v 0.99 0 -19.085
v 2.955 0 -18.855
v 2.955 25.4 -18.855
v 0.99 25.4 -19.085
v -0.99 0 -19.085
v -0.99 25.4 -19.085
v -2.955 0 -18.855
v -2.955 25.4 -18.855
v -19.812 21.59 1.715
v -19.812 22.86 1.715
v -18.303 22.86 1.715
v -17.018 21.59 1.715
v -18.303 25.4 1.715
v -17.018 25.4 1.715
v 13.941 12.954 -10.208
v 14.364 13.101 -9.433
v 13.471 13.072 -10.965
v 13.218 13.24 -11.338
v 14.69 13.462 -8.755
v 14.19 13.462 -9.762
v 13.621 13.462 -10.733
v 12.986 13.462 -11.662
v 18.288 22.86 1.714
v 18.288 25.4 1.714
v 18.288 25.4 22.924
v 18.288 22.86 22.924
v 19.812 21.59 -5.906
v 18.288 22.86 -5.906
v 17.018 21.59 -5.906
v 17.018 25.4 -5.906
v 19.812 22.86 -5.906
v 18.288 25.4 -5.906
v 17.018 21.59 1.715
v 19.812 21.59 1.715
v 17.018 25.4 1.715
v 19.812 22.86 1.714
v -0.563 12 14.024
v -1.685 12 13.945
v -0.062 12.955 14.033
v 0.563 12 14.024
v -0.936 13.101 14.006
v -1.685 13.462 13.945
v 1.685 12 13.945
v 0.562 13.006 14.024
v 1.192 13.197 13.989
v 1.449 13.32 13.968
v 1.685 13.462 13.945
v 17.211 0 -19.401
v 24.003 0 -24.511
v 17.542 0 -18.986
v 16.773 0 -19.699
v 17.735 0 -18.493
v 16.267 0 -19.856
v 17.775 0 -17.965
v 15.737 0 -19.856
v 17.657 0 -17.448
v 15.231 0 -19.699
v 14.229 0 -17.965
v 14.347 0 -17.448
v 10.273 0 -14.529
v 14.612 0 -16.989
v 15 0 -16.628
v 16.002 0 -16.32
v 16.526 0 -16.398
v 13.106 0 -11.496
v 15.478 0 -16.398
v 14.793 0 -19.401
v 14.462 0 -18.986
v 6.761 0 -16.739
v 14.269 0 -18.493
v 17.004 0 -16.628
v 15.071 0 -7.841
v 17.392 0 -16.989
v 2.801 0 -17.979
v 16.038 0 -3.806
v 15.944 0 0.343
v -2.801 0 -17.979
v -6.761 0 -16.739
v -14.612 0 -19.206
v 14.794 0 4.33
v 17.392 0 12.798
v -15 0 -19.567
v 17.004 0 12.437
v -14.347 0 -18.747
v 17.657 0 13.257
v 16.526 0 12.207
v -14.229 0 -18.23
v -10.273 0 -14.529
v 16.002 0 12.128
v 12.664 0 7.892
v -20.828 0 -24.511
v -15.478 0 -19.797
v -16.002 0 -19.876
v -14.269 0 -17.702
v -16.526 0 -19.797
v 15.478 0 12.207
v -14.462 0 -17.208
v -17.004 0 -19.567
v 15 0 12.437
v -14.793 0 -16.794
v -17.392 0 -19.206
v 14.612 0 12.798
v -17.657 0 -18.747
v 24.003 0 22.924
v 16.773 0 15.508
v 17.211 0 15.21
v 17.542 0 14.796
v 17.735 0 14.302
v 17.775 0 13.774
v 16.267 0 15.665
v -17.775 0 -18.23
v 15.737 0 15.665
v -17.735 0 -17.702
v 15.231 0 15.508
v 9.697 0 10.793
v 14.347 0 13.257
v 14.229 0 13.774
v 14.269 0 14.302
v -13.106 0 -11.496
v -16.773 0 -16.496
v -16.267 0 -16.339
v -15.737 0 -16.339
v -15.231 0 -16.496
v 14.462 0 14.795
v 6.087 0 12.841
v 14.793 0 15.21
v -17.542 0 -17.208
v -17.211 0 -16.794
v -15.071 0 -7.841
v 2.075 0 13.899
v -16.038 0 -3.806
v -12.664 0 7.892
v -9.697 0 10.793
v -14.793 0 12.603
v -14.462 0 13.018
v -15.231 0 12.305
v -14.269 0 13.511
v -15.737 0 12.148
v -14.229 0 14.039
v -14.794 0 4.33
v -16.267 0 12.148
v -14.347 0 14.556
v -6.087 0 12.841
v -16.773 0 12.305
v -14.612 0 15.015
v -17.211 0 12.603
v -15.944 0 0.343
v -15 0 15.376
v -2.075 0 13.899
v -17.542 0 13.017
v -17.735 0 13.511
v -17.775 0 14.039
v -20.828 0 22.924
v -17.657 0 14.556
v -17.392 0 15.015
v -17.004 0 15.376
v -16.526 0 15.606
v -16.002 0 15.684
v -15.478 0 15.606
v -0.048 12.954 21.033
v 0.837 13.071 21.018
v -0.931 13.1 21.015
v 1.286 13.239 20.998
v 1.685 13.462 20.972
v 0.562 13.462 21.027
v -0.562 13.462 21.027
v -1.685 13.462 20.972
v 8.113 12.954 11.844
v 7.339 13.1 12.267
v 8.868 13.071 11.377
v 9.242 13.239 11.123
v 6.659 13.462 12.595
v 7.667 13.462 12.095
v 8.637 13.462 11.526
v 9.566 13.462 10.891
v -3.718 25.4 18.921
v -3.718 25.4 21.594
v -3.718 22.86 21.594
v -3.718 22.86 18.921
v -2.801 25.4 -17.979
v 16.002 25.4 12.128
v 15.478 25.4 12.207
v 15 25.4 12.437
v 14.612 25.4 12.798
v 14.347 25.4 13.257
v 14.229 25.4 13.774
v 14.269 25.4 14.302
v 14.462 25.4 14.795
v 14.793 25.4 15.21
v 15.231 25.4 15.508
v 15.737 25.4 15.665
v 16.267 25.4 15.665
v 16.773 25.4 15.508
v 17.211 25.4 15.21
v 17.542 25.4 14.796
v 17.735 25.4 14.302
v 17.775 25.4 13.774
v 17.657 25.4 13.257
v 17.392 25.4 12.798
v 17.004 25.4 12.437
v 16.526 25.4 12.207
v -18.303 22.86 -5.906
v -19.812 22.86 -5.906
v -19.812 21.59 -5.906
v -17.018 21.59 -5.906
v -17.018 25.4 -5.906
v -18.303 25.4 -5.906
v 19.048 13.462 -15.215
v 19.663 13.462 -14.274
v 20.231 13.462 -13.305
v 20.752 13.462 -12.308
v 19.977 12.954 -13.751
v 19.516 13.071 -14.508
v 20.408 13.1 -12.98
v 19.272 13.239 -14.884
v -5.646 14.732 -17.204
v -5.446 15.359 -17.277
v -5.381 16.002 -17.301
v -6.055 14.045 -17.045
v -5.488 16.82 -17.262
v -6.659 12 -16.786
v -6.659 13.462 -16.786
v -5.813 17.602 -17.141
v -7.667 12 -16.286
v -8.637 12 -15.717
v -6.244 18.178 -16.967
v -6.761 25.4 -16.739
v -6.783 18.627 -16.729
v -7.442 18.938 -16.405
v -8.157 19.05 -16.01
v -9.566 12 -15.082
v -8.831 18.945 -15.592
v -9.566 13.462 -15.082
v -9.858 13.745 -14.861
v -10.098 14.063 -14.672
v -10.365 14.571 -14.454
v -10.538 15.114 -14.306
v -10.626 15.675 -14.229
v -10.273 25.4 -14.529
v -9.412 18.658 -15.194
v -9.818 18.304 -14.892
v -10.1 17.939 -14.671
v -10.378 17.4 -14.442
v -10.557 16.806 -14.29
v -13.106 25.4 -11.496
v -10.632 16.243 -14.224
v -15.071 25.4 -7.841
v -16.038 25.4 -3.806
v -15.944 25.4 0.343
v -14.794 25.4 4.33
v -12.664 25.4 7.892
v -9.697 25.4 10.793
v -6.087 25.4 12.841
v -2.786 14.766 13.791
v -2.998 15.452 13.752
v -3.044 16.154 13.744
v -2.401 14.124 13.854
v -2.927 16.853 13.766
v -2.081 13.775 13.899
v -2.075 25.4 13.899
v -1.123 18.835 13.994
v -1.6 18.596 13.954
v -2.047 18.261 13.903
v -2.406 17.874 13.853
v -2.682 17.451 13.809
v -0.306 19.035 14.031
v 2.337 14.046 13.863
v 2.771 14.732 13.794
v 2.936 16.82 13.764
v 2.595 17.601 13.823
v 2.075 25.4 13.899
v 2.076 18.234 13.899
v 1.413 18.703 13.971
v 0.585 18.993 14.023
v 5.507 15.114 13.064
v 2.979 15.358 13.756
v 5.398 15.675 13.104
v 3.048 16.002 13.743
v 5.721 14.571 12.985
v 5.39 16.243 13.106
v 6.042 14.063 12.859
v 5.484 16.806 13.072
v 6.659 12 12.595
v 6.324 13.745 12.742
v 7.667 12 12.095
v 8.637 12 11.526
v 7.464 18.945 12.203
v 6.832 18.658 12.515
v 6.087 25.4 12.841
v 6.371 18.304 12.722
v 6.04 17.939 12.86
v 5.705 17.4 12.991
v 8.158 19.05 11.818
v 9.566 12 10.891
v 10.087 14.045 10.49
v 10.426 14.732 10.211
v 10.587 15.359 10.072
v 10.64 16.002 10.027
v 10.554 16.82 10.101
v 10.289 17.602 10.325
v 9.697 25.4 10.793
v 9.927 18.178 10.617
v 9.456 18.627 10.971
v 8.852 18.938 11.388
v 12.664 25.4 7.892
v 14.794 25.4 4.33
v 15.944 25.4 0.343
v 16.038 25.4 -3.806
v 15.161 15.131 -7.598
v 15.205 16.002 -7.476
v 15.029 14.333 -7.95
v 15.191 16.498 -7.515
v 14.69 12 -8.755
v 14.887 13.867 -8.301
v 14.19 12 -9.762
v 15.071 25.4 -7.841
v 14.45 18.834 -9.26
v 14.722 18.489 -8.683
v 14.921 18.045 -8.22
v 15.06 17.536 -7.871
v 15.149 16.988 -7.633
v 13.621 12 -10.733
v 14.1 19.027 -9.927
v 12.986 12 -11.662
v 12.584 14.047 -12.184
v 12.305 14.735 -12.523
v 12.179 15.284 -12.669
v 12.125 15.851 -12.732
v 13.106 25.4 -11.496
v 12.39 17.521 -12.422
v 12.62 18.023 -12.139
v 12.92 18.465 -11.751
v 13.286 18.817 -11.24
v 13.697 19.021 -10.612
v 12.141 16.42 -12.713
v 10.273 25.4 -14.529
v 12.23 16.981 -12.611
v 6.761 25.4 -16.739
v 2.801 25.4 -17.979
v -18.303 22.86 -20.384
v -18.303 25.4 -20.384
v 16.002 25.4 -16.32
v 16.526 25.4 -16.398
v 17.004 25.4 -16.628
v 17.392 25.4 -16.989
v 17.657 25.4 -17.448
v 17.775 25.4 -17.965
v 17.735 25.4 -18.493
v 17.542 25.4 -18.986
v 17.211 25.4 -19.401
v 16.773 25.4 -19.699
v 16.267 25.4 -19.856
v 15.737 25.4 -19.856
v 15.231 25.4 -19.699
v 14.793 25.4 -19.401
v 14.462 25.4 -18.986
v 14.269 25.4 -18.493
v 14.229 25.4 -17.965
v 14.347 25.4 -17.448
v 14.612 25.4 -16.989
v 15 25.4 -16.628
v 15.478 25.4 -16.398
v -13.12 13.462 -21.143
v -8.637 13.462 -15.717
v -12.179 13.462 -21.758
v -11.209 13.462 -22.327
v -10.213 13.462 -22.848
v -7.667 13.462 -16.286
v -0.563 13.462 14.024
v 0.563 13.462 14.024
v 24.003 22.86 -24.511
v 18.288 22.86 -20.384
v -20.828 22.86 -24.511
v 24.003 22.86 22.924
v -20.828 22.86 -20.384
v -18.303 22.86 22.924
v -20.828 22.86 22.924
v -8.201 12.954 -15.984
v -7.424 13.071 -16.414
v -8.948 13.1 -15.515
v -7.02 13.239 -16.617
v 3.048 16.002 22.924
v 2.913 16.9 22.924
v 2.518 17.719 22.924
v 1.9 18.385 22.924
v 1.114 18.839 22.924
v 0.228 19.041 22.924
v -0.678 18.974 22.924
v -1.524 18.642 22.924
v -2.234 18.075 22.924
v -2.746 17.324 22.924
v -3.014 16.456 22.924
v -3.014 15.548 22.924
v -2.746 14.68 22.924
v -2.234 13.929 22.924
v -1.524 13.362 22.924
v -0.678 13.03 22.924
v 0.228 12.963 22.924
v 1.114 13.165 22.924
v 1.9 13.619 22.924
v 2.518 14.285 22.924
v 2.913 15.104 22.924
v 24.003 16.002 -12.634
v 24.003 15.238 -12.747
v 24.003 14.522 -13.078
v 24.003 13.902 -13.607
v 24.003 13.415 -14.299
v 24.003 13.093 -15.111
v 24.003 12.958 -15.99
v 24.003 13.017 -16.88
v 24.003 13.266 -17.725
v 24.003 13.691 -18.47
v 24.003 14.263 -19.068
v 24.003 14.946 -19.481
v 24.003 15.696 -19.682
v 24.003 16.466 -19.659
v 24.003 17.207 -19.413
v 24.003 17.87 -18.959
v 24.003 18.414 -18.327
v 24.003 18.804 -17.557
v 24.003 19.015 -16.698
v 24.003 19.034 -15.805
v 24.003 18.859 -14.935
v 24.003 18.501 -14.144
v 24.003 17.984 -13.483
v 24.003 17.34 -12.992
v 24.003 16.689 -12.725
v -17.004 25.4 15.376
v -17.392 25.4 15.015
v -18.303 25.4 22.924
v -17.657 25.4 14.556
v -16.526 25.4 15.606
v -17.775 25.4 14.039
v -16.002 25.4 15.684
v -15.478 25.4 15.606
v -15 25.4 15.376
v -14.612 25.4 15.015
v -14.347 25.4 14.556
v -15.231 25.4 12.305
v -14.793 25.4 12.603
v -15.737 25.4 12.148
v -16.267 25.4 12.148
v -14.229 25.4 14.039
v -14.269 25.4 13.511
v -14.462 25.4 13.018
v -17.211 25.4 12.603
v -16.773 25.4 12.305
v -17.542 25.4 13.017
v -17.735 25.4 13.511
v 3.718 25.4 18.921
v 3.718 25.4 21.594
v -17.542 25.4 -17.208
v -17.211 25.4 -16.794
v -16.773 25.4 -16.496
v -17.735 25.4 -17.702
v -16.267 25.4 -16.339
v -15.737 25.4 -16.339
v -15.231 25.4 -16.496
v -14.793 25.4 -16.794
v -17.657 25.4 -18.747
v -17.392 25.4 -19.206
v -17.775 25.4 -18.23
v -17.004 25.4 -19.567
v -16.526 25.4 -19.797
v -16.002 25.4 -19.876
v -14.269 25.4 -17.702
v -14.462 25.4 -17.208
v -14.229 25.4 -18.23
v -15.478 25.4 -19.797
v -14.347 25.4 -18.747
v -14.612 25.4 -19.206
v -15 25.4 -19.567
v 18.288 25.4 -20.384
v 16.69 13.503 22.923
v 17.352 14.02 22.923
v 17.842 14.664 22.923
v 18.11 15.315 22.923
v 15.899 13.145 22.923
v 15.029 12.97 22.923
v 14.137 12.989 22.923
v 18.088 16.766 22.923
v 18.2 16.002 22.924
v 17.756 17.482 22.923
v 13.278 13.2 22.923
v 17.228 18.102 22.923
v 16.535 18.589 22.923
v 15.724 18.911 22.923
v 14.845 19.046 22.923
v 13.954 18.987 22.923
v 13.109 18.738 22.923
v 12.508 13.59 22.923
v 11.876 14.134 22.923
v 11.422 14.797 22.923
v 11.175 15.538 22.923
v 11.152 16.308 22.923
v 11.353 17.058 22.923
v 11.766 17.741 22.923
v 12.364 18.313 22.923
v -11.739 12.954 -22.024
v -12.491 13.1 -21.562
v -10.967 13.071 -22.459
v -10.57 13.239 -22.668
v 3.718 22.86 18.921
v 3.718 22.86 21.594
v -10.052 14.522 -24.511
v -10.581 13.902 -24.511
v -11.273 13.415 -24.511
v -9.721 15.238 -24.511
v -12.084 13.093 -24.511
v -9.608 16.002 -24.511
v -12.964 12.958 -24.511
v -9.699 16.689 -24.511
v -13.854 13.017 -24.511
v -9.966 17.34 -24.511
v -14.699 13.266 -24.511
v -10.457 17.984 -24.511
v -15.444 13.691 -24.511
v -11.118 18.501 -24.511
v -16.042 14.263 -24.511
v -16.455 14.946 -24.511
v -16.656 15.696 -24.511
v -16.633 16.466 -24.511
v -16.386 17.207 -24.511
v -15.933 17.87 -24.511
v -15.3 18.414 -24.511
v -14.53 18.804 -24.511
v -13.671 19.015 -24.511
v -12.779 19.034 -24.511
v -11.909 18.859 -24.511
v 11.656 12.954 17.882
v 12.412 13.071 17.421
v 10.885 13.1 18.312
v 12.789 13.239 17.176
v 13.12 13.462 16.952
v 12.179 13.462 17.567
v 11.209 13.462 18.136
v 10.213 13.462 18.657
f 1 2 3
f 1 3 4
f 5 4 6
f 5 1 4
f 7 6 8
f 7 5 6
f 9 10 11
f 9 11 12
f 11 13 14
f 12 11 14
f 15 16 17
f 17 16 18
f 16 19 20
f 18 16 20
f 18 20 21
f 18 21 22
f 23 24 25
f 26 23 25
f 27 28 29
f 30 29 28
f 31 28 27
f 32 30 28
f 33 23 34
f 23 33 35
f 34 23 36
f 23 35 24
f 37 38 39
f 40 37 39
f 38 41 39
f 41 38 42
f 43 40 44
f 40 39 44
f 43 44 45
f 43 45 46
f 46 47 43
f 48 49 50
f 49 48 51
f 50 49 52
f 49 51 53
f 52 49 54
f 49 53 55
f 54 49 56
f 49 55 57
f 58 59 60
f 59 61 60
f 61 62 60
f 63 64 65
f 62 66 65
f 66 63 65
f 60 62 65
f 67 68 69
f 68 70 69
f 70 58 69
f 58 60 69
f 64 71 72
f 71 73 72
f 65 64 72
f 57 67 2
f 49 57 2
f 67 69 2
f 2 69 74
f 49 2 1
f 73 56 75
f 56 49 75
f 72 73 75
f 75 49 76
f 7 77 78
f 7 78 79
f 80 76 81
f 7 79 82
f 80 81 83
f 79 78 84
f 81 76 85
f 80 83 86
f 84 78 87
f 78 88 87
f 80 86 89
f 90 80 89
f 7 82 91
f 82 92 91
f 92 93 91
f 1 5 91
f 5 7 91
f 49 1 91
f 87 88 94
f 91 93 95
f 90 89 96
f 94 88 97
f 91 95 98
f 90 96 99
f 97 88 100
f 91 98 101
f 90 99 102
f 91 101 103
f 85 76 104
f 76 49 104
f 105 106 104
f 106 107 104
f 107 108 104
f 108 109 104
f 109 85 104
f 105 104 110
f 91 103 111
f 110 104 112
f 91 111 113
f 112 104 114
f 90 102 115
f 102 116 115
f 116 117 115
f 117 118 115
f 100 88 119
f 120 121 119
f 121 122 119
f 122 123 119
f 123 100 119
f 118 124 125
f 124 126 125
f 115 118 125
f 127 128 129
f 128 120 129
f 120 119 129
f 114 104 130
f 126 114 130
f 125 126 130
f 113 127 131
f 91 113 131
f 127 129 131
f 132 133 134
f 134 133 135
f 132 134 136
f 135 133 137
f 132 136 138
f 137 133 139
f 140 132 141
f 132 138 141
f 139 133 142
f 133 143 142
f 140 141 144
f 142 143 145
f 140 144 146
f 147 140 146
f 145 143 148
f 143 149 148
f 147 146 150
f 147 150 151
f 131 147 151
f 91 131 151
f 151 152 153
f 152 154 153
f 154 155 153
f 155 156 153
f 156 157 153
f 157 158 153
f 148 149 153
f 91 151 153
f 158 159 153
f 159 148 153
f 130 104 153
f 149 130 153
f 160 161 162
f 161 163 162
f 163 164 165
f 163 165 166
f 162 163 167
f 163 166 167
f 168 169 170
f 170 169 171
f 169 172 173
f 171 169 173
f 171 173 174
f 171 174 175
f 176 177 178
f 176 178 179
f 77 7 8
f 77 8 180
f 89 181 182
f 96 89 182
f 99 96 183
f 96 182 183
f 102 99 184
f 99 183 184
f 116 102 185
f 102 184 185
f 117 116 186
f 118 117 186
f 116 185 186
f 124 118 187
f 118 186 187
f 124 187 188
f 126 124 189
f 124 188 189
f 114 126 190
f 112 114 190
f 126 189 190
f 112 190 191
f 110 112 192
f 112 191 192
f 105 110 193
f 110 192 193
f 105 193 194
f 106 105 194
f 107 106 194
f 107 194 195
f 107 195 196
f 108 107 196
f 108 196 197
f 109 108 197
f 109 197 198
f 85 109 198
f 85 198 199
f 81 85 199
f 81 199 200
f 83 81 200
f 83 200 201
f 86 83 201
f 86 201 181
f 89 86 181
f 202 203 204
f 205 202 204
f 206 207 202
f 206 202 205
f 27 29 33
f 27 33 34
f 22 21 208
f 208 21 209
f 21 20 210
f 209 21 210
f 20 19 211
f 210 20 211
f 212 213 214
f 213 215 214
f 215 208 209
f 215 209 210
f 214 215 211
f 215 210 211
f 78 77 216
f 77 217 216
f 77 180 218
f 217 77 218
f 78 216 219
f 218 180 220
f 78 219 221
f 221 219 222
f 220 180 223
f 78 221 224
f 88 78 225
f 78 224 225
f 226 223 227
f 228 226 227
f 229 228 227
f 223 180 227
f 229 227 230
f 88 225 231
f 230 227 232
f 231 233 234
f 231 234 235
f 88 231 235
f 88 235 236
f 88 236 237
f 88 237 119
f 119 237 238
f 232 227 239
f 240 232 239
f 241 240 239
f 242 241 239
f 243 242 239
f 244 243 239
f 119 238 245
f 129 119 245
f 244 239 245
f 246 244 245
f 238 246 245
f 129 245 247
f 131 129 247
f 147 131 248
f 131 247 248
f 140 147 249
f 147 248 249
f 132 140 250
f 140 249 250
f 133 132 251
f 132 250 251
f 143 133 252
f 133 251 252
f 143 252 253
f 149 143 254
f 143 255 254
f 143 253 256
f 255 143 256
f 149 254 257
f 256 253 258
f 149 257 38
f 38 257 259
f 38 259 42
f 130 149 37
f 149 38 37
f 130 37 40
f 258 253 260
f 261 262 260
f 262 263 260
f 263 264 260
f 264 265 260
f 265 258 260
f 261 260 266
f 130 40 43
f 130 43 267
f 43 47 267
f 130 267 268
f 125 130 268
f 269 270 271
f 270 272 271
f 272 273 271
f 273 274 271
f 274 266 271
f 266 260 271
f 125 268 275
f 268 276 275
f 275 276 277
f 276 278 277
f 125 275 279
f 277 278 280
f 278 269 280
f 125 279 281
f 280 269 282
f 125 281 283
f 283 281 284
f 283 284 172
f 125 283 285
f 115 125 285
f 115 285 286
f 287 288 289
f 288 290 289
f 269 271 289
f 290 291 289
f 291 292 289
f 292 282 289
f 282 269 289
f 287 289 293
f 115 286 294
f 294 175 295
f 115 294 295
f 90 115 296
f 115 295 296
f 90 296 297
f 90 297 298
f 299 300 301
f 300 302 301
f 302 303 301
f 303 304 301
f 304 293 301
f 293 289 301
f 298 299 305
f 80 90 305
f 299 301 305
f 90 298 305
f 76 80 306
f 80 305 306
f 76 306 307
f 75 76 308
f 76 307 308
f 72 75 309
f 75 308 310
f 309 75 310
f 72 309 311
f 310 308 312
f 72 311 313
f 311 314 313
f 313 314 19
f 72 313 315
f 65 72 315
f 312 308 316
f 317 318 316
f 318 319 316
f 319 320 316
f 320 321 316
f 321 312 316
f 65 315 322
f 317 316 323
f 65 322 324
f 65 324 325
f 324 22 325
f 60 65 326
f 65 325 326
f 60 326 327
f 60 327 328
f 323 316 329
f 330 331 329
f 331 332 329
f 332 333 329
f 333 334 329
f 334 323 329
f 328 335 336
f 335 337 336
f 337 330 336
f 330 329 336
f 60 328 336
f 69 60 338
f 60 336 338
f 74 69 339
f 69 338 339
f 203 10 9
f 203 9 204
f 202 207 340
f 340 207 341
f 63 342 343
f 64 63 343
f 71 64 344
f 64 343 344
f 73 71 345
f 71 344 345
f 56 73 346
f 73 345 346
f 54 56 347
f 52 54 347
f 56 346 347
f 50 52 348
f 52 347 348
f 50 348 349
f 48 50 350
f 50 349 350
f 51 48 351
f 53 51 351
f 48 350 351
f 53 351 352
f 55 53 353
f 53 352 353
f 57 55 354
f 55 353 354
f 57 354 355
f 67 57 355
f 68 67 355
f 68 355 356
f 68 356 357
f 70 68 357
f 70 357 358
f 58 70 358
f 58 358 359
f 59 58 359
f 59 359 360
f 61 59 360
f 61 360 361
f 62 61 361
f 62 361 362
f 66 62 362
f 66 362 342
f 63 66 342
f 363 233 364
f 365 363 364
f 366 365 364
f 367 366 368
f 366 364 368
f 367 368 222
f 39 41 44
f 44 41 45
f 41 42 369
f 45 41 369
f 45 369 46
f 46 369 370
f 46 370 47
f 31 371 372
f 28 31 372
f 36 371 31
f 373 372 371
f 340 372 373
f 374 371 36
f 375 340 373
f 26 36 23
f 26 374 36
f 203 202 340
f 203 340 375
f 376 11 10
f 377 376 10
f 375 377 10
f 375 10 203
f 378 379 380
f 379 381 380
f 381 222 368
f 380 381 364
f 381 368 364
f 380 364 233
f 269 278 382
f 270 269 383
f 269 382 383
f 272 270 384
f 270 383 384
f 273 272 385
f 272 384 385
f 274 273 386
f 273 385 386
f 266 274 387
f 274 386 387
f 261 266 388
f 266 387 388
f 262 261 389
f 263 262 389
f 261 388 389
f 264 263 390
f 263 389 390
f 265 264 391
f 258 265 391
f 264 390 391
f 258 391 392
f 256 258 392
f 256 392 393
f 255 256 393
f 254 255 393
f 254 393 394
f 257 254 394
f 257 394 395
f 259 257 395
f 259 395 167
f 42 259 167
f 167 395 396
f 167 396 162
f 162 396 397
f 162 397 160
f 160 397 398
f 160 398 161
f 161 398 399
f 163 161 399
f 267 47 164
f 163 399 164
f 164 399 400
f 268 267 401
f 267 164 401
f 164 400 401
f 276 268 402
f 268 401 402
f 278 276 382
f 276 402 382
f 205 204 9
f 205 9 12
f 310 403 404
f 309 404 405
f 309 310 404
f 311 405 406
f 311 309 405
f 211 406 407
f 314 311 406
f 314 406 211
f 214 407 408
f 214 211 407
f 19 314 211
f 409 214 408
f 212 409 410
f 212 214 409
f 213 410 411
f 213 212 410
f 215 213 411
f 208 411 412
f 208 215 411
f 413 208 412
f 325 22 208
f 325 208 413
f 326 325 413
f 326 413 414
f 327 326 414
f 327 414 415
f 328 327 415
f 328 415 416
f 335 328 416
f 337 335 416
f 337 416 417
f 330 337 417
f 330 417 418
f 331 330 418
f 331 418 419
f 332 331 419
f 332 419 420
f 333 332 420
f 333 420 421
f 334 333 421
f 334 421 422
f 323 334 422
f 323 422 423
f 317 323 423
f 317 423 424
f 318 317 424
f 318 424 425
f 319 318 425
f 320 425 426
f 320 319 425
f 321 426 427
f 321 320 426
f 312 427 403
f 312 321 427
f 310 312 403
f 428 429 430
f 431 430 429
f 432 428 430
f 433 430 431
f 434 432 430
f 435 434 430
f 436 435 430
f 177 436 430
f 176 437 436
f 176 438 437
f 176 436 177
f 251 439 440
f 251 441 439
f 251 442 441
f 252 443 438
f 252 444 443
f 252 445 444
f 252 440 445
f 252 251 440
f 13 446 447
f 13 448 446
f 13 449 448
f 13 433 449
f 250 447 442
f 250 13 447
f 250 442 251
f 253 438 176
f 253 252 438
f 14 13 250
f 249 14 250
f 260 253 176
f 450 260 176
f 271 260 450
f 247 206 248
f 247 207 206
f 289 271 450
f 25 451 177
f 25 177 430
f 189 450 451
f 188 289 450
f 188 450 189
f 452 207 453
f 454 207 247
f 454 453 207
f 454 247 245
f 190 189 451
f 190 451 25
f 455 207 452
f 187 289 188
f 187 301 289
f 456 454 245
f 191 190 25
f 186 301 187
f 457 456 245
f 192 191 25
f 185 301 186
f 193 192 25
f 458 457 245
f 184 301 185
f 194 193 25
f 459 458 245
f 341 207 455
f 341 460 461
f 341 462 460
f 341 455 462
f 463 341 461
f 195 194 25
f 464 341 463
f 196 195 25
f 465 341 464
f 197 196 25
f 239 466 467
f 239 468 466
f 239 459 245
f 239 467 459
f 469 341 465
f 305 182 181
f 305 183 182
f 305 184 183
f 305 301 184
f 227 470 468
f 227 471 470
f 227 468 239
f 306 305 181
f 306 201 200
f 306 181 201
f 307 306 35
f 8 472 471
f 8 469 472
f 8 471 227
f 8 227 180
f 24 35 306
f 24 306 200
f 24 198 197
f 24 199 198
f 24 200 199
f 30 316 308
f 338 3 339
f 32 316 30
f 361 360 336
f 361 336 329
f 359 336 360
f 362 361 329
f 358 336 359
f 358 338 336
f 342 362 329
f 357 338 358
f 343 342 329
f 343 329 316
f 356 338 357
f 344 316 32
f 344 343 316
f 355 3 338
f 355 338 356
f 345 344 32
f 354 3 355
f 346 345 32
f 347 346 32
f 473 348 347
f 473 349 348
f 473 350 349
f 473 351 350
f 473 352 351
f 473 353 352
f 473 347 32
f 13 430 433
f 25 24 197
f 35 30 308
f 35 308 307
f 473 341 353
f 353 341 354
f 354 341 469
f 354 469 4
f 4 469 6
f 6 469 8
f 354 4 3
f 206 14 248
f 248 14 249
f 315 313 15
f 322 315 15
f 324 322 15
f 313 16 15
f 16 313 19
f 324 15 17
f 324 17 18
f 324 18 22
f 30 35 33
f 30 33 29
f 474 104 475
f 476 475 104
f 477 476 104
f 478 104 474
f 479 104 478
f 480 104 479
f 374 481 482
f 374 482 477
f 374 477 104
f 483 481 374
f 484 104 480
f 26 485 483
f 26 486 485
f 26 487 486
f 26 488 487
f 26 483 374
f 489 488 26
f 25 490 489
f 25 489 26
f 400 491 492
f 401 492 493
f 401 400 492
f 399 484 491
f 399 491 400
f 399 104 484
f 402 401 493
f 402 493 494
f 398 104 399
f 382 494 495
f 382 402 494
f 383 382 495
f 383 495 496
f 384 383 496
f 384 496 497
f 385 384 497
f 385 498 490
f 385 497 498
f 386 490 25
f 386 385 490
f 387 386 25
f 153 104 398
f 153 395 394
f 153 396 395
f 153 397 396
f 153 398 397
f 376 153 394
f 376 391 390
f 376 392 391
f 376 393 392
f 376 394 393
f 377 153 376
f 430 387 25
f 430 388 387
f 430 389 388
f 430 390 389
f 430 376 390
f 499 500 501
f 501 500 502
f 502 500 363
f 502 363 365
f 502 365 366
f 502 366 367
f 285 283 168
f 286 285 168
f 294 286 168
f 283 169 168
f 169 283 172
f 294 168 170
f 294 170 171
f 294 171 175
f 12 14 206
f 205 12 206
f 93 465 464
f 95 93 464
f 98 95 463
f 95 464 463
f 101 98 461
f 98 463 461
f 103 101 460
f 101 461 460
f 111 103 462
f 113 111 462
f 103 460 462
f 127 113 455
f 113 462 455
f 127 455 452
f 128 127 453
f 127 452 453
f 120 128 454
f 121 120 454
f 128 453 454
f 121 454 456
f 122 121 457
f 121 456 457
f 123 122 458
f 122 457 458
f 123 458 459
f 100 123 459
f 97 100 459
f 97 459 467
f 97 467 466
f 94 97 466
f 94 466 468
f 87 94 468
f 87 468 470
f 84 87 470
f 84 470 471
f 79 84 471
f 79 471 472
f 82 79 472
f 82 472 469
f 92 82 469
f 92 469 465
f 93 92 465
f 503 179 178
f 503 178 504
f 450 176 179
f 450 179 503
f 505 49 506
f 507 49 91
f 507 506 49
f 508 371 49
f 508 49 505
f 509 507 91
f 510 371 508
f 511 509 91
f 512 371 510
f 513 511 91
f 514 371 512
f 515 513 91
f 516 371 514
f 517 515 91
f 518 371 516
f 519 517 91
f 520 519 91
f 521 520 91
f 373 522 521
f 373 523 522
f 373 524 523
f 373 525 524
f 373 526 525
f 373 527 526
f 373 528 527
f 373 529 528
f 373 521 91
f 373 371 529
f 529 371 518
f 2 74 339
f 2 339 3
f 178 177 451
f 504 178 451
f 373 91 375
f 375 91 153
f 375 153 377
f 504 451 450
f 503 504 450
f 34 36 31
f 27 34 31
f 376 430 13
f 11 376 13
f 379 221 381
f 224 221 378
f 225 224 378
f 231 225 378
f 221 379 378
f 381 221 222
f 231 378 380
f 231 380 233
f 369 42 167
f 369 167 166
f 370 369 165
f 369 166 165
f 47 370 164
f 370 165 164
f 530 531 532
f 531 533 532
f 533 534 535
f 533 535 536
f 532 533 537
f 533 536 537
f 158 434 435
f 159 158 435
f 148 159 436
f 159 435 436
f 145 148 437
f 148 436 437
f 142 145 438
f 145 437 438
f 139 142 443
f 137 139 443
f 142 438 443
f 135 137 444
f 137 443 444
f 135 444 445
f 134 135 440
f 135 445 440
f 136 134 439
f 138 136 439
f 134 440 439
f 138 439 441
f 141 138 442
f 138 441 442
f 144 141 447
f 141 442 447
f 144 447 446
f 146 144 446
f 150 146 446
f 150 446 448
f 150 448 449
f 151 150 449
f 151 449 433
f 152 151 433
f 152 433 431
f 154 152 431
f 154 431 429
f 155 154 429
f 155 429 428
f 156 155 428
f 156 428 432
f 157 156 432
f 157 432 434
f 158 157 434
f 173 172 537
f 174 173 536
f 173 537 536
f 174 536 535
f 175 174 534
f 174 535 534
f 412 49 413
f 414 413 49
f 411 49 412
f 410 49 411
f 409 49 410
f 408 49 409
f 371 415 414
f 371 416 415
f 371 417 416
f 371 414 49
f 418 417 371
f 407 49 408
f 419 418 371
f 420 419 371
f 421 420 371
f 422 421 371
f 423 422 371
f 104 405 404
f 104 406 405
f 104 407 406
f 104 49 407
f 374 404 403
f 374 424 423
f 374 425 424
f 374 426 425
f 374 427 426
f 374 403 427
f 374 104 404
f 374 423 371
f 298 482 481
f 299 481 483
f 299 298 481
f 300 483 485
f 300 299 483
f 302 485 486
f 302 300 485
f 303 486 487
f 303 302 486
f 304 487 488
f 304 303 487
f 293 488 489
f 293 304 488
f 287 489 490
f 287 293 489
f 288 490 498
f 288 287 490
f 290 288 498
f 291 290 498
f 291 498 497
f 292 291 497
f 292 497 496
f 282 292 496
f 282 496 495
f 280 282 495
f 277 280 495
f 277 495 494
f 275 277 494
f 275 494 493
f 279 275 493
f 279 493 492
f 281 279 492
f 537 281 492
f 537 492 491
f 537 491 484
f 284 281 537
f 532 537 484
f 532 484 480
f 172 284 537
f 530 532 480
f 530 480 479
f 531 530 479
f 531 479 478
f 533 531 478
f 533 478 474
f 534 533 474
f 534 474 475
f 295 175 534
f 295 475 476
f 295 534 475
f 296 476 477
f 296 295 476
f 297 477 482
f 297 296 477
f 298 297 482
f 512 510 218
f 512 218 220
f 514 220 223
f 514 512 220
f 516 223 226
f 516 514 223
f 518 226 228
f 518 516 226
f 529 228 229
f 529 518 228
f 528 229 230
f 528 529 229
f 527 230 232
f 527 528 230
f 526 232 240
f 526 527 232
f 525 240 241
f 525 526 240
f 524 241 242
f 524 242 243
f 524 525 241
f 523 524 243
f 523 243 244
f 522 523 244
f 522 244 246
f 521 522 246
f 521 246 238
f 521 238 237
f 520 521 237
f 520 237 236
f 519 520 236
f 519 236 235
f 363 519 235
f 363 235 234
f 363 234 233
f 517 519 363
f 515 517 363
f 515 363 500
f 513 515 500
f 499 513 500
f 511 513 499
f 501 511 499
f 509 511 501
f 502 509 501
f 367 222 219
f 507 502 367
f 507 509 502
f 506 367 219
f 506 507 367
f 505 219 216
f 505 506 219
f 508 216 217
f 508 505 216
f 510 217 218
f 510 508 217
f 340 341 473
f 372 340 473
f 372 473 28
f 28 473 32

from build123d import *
from build123d.topology import SkipClean

# Parameters (mm, degrees)
SKETCH1_W                = 41.656
SKETCH1_H                = 45.847
BOSS_EXTRUDE1_DEPTH      = 25.4
SKETCH2_R                = 16.129
CUT_EXTRUDE1_DEPTH       = 25.4
SKETCH3_W                = 2.794
SKETCH3_H                = 7.62
CUT_EXTRUDE2_DEPTH       = 3.81
CUT_EXTRUDE6_START       = -25.4
CUT_EXTRUDE6_DEPTH       = 25.4
CUT_EXTRUDE7_REACH       = 58.4
CUT_EXTRUDE7_END_RADIUS  = 16.129
SKETCH7_R                = 3.048
SKETCH14_W               = 7.43654476
SKETCH14_H               = 2.672753785
SKETCH14_W_2             = 2.524584731
SKETCH14_H_2             = 43.307
CUT_EXTRUDE10_DEPTH      = 2.54
SKETCH17_W               = 45.847
SKETCH17_H               = 22.86
BOSS_EXTRUDE3_DEPTH      = 3.175
CUT_EXTRUDE12_REACH      = 43.576
SKETCH12_R               = 3.048
SKETCH18_W               = 44.831
SKETCH18_H               = 22.86
BOSS_EXTRUDE4_DEPTH      = 1.5875
CUT_EXTRUDE13_DEPTH      = 44.190833792
CUT_EXTRUDE13_DEPTH_BACK = 44.190833792
SKETCH11_R               = 3.048
BOSS_EXTRUDE8_START      = -13.462
BOSS_EXTRUDE8_DEPTH      = 1.462
SKETCH4_R                = 1.778
CUT_EXTRUDE14_DEPTH      = 43.685983001


with BuildPart() as part:
    # Sketch1 → Boss-Extrude1 (new body)
    with BuildSketch(Plane(origin=(0, 0, 0), x_dir=(1, 0, 0), z_dir=(0, 1, 0))):
        Rectangle(SKETCH1_W, SKETCH1_H)
    extrude(amount=BOSS_EXTRUDE1_DEPTH)

    # Sketch2 → Cut-Extrude1 (cut)
    with BuildSketch(Plane(origin=(0, 25.4, 0), x_dir=(1, 0, 0), z_dir=(0, 1, 0))):
        with Locations(Location((0, 2.0955, 0), (0, 0, 270))):
            Circle(SKETCH2_R)
    extrude(amount=-CUT_EXTRUDE1_DEPTH, mode=Mode.SUBTRACT)

    # Sketch3 → Cut-Extrude2 (cut)
    with BuildSketch(Plane(origin=(0, 25.4, 0), x_dir=(1, 0, 0), z_dir=(0, 1, 0))):
        with Locations((18.415, 2.0955)):
            Rectangle(SKETCH3_W, SKETCH3_H)
        with Locations((-18.415, 2.0955)):
            Rectangle(SKETCH3_W, SKETCH3_H)
    extrude(amount=-CUT_EXTRUDE2_DEPTH, mode=Mode.SUBTRACT)

    # Sketch6 → Cut-Extrude6 (cut)
    with BuildSketch(Plane(origin=(0, 25.4, 0), x_dir=(1, 0, 0), z_dir=(0, 1, 0)).offset(CUT_EXTRUDE6_START)):
        with BuildLine():
            ThreePointArc((-2.800771458, 17.979464248), (-1.405734975, 18.163124286), (0, 18.2245))
            ThreePointArc((0, 18.2245), (1.405734975, 18.163124286), (2.800771458, 17.979464248))
            Line((2.800771458, 17.979464248), (2.955144688, 18.854958341))
            ThreePointArc((2.955144688, 18.854958341), (0, 19.1135), (-2.955144688, 18.854958341))
            Line((-2.955144688, 18.854958341), (-2.800771458, 17.979464248))
        make_face()
        with BuildLine():
            Line((0, 18.2245), (0, 2.0955))
            Line((0, 2.0955), (2.800771458, 17.979464248))
            ThreePointArc((2.800771458, 17.979464248), (1.405734975, 18.163124286), (0, 18.2245))
        make_face()
        with BuildLine():
            Line((-2.800771458, 17.979464248), (0, 2.0955))
            Line((0, 2.0955), (0, 18.2245))
            ThreePointArc((0, 18.2245), (-1.405734975, 18.163124286), (-2.800771458, 17.979464248))
        make_face()
    extrude(amount=CUT_EXTRUDE6_DEPTH, mode=Mode.SUBTRACT)

    # Cut-Extrude7: up to this cylinder (the profile starts outside it)
    cut_extrude7_end = Plane(origin=(0, 16.002, -2.0955), z_dir=(0, 1, 0)) * Cylinder(CUT_EXTRUDE7_END_RADIUS, 150.058, mode=Mode.PRIVATE)
    # Sketch7 → Cut-Extrude7 (cut, up to the surface)
    with BuildSketch(Plane.XY.offset(22.9235), mode=Mode.PRIVATE) as cut_extrude7_sk1:
        with Locations((0, 16.002)):
            Circle(SKETCH7_R)
    cut_extrude7_tool1 = extrude(cut_extrude7_sk1.sketch, amount=-CUT_EXTRUDE7_REACH, mode=Mode.PRIVATE) - cut_extrude7_end
    add(cut_extrude7_tool1.solids().sort_by_distance((0, 16.002, 22.9235))[0], mode=Mode.SUBTRACT)

    # Sketch14 → Cut-Extrude10 (cut)
    with BuildSketch(Plane(origin=(0, 25.4, 0), x_dir=(1, 0, 0), z_dir=(0, 1, 0))):
        with Locations((0, -20.25731759)):
            Rectangle(SKETCH14_W, SKETCH14_H)
        Polygon((20.828, -22.9235), (20.828, 20.3835), (18.288, 20.3835), (18.288, 5.9055), (19.812, 5.9055), (19.812, -1.7145), (18.288, -1.7145), (18.288, -22.9235), align=None)
        Polygon((20.828, 22.9235), (-20.828, 22.9235), (-20.828, 20.3835), (-18.303415269, 20.3835), (18.288, 20.3835), (20.828, 20.3835), align=None)
        with Locations((-19.565707635, -1.27)):
            Rectangle(SKETCH14_W_2, SKETCH14_H_2)
    extrude(amount=-CUT_EXTRUDE10_DEPTH, mode=Mode.SUBTRACT)

    # Sketch17 → Boss-Extrude3 (add)
    with BuildSketch(Plane(origin=(20.828, 0, 0), x_dir=(0, 0, -1), z_dir=(1, 0, 0))):
        with Locations((0, 11.43)):
            Rectangle(SKETCH17_W, SKETCH17_H)
    extrude(amount=BOSS_EXTRUDE3_DEPTH)

    # Cut-Extrude12: up to this plane
    cut_extrude12_end = Plane(origin=(24.003, 0, 0), z_dir=(1, 0, 0))
    # Sketch12 → Cut-Extrude12 (cut, up to the surface)
    with BuildSketch(Plane(origin=(0.914260378, 0, -0.535980498), x_dir=(-0.50574390925612, 0, -0.862683660590797), z_dir=(0.862683660590797, 0, -0.50574390925612)), mode=Mode.PRIVATE) as cut_extrude12_sk1:
        with Locations(Location((1.807753611, 16.002, 0), (0, 0, 180))):
            Circle(SKETCH12_R)
    cut_extrude12_tool1 = split(extrude(cut_extrude12_sk1.sketch, amount=CUT_EXTRUDE12_REACH, mode=Mode.PRIVATE), bisect_by=cut_extrude12_end, keep=Keep.BOTH, mode=Mode.PRIVATE)
    add(cut_extrude12_tool1.solids().sort_by_distance((0, 16.002, -2.0955))[0], mode=Mode.SUBTRACT)

    # Sketch18 → Boss-Extrude4 (add)
    with BuildSketch(Plane(origin=(0, 0, -22.9235), x_dir=(-1, 0, 0), z_dir=(0, 0, -1))):
        with Locations((-1.5875, 11.43)):
            Rectangle(SKETCH18_W, SKETCH18_H)
    extrude(amount=BOSS_EXTRUDE4_DEPTH)

    # Sketch11 → Cut-Extrude13 (cut, two sides: drawn at the far end of the back side and taken through both)
    with BuildSketch(Plane(origin=(-0.914260378, 0, -1.559519502), x_dir=(0.862683660590797, 0, -0.50574390925612), z_dir=(0.50574390925612, 0, 0.862683660590797)).offset(-CUT_EXTRUDE13_DEPTH_BACK)):
        with Locations((1.059786362, 16.002)):
            Circle(SKETCH11_R)
    extrude(amount=CUT_EXTRUDE13_DEPTH + CUT_EXTRUDE13_DEPTH_BACK, mode=Mode.SUBTRACT)

    # Boss-Extrude8: read off the stored shape, not the designer's step
    # Boss-Extrude8 outline → Boss-Extrude8 (add)
    with SkipClean():  # the faces are left unmerged after this step: merging them gives an invalid solid
        with BuildSketch(Plane.XZ.offset(BOSS_EXTRUDE8_START)):
            with BuildLine():
                ThreePointArc((13.119762317, 16.952399563), (11.697350877, 17.857510386), (10.212785134, 18.656600154))
                Line((10.212785134, 18.656600154), (6.659027379, 12.594700658))
                ThreePointArc((6.659027379, 12.594700658), (8.157143512, 11.818724762), (9.566004562, 10.890500066))
                Line((9.566004562, 10.890500066), (13.119762317, 16.952399563))
            make_face()
            with BuildLine():
                ThreePointArc((-6.659027379, -16.785700658), (-8.157143512, -16.009724762), (-9.566004562, -15.081500066))
                Line((-9.566004562, -15.081500066), (-13.119762317, -21.143399563))
                ThreePointArc((-13.119762317, -21.143399563), (-11.697350877, -22.048510386), (-10.212785134, -22.847600154))
                Line((-10.212785134, -22.847600154), (-6.659027379, -16.785700658))
            make_face()
            with BuildLine():
                Line((20.752100154, -12.308285134), (14.690200658, -8.754527379))
                ThreePointArc((14.690200658, -8.754527379), (13.914224762, -10.252643512), (12.986000066, -11.661504562))
                Line((12.986000066, -11.661504562), (19.047899563, -15.215262317))
                ThreePointArc((19.047899563, -15.215262317), (19.953010386, -13.792850877), (20.752100154, -12.308285134))
            make_face()
            with BuildLine():
                ThreePointArc((1.684845394, 20.972051604), (0, 21.0335), (-1.684845394, 20.972051604))
                Line((-1.684845394, 20.972051604), (-1.684845394, 13.945258617))
                ThreePointArc((-1.684845394, 13.945258617), (0, 14.0335), (1.684845394, 13.945258617))
                Line((1.684845394, 13.945258617), (1.684845394, 20.972051604))
            make_face()
        extrude(amount=BOSS_EXTRUDE8_DEPTH)

    # Sketch4 → Cut-Extrude14 (cut, through all)
    with SkipClean():  # the faces are left unmerged after this step: merging them gives an invalid solid
        with BuildSketch(Plane(origin=(0, 25.4, 0), x_dir=(1, 0, 0), z_dir=(0, 1, 0))):
            with Locations(Location((-16.002, -13.9065, 0), (0, 0, 270))):
                Circle(SKETCH4_R)
            with Locations(Location((-16.002, 18.0975, 0), (0, 0, 90))):
                Circle(SKETCH4_R)
            with Locations(Location((16.002, 18.0975, 0), (0, 0, 270))):
                Circle(SKETCH4_R)
            with Locations(Location((16.002, -13.9065, 0), (0, 0, 90))):
                Circle(SKETCH4_R)
        extrude(amount=-CUT_EXTRUDE14_DEPTH, mode=Mode.SUBTRACT)


solid = part.part
